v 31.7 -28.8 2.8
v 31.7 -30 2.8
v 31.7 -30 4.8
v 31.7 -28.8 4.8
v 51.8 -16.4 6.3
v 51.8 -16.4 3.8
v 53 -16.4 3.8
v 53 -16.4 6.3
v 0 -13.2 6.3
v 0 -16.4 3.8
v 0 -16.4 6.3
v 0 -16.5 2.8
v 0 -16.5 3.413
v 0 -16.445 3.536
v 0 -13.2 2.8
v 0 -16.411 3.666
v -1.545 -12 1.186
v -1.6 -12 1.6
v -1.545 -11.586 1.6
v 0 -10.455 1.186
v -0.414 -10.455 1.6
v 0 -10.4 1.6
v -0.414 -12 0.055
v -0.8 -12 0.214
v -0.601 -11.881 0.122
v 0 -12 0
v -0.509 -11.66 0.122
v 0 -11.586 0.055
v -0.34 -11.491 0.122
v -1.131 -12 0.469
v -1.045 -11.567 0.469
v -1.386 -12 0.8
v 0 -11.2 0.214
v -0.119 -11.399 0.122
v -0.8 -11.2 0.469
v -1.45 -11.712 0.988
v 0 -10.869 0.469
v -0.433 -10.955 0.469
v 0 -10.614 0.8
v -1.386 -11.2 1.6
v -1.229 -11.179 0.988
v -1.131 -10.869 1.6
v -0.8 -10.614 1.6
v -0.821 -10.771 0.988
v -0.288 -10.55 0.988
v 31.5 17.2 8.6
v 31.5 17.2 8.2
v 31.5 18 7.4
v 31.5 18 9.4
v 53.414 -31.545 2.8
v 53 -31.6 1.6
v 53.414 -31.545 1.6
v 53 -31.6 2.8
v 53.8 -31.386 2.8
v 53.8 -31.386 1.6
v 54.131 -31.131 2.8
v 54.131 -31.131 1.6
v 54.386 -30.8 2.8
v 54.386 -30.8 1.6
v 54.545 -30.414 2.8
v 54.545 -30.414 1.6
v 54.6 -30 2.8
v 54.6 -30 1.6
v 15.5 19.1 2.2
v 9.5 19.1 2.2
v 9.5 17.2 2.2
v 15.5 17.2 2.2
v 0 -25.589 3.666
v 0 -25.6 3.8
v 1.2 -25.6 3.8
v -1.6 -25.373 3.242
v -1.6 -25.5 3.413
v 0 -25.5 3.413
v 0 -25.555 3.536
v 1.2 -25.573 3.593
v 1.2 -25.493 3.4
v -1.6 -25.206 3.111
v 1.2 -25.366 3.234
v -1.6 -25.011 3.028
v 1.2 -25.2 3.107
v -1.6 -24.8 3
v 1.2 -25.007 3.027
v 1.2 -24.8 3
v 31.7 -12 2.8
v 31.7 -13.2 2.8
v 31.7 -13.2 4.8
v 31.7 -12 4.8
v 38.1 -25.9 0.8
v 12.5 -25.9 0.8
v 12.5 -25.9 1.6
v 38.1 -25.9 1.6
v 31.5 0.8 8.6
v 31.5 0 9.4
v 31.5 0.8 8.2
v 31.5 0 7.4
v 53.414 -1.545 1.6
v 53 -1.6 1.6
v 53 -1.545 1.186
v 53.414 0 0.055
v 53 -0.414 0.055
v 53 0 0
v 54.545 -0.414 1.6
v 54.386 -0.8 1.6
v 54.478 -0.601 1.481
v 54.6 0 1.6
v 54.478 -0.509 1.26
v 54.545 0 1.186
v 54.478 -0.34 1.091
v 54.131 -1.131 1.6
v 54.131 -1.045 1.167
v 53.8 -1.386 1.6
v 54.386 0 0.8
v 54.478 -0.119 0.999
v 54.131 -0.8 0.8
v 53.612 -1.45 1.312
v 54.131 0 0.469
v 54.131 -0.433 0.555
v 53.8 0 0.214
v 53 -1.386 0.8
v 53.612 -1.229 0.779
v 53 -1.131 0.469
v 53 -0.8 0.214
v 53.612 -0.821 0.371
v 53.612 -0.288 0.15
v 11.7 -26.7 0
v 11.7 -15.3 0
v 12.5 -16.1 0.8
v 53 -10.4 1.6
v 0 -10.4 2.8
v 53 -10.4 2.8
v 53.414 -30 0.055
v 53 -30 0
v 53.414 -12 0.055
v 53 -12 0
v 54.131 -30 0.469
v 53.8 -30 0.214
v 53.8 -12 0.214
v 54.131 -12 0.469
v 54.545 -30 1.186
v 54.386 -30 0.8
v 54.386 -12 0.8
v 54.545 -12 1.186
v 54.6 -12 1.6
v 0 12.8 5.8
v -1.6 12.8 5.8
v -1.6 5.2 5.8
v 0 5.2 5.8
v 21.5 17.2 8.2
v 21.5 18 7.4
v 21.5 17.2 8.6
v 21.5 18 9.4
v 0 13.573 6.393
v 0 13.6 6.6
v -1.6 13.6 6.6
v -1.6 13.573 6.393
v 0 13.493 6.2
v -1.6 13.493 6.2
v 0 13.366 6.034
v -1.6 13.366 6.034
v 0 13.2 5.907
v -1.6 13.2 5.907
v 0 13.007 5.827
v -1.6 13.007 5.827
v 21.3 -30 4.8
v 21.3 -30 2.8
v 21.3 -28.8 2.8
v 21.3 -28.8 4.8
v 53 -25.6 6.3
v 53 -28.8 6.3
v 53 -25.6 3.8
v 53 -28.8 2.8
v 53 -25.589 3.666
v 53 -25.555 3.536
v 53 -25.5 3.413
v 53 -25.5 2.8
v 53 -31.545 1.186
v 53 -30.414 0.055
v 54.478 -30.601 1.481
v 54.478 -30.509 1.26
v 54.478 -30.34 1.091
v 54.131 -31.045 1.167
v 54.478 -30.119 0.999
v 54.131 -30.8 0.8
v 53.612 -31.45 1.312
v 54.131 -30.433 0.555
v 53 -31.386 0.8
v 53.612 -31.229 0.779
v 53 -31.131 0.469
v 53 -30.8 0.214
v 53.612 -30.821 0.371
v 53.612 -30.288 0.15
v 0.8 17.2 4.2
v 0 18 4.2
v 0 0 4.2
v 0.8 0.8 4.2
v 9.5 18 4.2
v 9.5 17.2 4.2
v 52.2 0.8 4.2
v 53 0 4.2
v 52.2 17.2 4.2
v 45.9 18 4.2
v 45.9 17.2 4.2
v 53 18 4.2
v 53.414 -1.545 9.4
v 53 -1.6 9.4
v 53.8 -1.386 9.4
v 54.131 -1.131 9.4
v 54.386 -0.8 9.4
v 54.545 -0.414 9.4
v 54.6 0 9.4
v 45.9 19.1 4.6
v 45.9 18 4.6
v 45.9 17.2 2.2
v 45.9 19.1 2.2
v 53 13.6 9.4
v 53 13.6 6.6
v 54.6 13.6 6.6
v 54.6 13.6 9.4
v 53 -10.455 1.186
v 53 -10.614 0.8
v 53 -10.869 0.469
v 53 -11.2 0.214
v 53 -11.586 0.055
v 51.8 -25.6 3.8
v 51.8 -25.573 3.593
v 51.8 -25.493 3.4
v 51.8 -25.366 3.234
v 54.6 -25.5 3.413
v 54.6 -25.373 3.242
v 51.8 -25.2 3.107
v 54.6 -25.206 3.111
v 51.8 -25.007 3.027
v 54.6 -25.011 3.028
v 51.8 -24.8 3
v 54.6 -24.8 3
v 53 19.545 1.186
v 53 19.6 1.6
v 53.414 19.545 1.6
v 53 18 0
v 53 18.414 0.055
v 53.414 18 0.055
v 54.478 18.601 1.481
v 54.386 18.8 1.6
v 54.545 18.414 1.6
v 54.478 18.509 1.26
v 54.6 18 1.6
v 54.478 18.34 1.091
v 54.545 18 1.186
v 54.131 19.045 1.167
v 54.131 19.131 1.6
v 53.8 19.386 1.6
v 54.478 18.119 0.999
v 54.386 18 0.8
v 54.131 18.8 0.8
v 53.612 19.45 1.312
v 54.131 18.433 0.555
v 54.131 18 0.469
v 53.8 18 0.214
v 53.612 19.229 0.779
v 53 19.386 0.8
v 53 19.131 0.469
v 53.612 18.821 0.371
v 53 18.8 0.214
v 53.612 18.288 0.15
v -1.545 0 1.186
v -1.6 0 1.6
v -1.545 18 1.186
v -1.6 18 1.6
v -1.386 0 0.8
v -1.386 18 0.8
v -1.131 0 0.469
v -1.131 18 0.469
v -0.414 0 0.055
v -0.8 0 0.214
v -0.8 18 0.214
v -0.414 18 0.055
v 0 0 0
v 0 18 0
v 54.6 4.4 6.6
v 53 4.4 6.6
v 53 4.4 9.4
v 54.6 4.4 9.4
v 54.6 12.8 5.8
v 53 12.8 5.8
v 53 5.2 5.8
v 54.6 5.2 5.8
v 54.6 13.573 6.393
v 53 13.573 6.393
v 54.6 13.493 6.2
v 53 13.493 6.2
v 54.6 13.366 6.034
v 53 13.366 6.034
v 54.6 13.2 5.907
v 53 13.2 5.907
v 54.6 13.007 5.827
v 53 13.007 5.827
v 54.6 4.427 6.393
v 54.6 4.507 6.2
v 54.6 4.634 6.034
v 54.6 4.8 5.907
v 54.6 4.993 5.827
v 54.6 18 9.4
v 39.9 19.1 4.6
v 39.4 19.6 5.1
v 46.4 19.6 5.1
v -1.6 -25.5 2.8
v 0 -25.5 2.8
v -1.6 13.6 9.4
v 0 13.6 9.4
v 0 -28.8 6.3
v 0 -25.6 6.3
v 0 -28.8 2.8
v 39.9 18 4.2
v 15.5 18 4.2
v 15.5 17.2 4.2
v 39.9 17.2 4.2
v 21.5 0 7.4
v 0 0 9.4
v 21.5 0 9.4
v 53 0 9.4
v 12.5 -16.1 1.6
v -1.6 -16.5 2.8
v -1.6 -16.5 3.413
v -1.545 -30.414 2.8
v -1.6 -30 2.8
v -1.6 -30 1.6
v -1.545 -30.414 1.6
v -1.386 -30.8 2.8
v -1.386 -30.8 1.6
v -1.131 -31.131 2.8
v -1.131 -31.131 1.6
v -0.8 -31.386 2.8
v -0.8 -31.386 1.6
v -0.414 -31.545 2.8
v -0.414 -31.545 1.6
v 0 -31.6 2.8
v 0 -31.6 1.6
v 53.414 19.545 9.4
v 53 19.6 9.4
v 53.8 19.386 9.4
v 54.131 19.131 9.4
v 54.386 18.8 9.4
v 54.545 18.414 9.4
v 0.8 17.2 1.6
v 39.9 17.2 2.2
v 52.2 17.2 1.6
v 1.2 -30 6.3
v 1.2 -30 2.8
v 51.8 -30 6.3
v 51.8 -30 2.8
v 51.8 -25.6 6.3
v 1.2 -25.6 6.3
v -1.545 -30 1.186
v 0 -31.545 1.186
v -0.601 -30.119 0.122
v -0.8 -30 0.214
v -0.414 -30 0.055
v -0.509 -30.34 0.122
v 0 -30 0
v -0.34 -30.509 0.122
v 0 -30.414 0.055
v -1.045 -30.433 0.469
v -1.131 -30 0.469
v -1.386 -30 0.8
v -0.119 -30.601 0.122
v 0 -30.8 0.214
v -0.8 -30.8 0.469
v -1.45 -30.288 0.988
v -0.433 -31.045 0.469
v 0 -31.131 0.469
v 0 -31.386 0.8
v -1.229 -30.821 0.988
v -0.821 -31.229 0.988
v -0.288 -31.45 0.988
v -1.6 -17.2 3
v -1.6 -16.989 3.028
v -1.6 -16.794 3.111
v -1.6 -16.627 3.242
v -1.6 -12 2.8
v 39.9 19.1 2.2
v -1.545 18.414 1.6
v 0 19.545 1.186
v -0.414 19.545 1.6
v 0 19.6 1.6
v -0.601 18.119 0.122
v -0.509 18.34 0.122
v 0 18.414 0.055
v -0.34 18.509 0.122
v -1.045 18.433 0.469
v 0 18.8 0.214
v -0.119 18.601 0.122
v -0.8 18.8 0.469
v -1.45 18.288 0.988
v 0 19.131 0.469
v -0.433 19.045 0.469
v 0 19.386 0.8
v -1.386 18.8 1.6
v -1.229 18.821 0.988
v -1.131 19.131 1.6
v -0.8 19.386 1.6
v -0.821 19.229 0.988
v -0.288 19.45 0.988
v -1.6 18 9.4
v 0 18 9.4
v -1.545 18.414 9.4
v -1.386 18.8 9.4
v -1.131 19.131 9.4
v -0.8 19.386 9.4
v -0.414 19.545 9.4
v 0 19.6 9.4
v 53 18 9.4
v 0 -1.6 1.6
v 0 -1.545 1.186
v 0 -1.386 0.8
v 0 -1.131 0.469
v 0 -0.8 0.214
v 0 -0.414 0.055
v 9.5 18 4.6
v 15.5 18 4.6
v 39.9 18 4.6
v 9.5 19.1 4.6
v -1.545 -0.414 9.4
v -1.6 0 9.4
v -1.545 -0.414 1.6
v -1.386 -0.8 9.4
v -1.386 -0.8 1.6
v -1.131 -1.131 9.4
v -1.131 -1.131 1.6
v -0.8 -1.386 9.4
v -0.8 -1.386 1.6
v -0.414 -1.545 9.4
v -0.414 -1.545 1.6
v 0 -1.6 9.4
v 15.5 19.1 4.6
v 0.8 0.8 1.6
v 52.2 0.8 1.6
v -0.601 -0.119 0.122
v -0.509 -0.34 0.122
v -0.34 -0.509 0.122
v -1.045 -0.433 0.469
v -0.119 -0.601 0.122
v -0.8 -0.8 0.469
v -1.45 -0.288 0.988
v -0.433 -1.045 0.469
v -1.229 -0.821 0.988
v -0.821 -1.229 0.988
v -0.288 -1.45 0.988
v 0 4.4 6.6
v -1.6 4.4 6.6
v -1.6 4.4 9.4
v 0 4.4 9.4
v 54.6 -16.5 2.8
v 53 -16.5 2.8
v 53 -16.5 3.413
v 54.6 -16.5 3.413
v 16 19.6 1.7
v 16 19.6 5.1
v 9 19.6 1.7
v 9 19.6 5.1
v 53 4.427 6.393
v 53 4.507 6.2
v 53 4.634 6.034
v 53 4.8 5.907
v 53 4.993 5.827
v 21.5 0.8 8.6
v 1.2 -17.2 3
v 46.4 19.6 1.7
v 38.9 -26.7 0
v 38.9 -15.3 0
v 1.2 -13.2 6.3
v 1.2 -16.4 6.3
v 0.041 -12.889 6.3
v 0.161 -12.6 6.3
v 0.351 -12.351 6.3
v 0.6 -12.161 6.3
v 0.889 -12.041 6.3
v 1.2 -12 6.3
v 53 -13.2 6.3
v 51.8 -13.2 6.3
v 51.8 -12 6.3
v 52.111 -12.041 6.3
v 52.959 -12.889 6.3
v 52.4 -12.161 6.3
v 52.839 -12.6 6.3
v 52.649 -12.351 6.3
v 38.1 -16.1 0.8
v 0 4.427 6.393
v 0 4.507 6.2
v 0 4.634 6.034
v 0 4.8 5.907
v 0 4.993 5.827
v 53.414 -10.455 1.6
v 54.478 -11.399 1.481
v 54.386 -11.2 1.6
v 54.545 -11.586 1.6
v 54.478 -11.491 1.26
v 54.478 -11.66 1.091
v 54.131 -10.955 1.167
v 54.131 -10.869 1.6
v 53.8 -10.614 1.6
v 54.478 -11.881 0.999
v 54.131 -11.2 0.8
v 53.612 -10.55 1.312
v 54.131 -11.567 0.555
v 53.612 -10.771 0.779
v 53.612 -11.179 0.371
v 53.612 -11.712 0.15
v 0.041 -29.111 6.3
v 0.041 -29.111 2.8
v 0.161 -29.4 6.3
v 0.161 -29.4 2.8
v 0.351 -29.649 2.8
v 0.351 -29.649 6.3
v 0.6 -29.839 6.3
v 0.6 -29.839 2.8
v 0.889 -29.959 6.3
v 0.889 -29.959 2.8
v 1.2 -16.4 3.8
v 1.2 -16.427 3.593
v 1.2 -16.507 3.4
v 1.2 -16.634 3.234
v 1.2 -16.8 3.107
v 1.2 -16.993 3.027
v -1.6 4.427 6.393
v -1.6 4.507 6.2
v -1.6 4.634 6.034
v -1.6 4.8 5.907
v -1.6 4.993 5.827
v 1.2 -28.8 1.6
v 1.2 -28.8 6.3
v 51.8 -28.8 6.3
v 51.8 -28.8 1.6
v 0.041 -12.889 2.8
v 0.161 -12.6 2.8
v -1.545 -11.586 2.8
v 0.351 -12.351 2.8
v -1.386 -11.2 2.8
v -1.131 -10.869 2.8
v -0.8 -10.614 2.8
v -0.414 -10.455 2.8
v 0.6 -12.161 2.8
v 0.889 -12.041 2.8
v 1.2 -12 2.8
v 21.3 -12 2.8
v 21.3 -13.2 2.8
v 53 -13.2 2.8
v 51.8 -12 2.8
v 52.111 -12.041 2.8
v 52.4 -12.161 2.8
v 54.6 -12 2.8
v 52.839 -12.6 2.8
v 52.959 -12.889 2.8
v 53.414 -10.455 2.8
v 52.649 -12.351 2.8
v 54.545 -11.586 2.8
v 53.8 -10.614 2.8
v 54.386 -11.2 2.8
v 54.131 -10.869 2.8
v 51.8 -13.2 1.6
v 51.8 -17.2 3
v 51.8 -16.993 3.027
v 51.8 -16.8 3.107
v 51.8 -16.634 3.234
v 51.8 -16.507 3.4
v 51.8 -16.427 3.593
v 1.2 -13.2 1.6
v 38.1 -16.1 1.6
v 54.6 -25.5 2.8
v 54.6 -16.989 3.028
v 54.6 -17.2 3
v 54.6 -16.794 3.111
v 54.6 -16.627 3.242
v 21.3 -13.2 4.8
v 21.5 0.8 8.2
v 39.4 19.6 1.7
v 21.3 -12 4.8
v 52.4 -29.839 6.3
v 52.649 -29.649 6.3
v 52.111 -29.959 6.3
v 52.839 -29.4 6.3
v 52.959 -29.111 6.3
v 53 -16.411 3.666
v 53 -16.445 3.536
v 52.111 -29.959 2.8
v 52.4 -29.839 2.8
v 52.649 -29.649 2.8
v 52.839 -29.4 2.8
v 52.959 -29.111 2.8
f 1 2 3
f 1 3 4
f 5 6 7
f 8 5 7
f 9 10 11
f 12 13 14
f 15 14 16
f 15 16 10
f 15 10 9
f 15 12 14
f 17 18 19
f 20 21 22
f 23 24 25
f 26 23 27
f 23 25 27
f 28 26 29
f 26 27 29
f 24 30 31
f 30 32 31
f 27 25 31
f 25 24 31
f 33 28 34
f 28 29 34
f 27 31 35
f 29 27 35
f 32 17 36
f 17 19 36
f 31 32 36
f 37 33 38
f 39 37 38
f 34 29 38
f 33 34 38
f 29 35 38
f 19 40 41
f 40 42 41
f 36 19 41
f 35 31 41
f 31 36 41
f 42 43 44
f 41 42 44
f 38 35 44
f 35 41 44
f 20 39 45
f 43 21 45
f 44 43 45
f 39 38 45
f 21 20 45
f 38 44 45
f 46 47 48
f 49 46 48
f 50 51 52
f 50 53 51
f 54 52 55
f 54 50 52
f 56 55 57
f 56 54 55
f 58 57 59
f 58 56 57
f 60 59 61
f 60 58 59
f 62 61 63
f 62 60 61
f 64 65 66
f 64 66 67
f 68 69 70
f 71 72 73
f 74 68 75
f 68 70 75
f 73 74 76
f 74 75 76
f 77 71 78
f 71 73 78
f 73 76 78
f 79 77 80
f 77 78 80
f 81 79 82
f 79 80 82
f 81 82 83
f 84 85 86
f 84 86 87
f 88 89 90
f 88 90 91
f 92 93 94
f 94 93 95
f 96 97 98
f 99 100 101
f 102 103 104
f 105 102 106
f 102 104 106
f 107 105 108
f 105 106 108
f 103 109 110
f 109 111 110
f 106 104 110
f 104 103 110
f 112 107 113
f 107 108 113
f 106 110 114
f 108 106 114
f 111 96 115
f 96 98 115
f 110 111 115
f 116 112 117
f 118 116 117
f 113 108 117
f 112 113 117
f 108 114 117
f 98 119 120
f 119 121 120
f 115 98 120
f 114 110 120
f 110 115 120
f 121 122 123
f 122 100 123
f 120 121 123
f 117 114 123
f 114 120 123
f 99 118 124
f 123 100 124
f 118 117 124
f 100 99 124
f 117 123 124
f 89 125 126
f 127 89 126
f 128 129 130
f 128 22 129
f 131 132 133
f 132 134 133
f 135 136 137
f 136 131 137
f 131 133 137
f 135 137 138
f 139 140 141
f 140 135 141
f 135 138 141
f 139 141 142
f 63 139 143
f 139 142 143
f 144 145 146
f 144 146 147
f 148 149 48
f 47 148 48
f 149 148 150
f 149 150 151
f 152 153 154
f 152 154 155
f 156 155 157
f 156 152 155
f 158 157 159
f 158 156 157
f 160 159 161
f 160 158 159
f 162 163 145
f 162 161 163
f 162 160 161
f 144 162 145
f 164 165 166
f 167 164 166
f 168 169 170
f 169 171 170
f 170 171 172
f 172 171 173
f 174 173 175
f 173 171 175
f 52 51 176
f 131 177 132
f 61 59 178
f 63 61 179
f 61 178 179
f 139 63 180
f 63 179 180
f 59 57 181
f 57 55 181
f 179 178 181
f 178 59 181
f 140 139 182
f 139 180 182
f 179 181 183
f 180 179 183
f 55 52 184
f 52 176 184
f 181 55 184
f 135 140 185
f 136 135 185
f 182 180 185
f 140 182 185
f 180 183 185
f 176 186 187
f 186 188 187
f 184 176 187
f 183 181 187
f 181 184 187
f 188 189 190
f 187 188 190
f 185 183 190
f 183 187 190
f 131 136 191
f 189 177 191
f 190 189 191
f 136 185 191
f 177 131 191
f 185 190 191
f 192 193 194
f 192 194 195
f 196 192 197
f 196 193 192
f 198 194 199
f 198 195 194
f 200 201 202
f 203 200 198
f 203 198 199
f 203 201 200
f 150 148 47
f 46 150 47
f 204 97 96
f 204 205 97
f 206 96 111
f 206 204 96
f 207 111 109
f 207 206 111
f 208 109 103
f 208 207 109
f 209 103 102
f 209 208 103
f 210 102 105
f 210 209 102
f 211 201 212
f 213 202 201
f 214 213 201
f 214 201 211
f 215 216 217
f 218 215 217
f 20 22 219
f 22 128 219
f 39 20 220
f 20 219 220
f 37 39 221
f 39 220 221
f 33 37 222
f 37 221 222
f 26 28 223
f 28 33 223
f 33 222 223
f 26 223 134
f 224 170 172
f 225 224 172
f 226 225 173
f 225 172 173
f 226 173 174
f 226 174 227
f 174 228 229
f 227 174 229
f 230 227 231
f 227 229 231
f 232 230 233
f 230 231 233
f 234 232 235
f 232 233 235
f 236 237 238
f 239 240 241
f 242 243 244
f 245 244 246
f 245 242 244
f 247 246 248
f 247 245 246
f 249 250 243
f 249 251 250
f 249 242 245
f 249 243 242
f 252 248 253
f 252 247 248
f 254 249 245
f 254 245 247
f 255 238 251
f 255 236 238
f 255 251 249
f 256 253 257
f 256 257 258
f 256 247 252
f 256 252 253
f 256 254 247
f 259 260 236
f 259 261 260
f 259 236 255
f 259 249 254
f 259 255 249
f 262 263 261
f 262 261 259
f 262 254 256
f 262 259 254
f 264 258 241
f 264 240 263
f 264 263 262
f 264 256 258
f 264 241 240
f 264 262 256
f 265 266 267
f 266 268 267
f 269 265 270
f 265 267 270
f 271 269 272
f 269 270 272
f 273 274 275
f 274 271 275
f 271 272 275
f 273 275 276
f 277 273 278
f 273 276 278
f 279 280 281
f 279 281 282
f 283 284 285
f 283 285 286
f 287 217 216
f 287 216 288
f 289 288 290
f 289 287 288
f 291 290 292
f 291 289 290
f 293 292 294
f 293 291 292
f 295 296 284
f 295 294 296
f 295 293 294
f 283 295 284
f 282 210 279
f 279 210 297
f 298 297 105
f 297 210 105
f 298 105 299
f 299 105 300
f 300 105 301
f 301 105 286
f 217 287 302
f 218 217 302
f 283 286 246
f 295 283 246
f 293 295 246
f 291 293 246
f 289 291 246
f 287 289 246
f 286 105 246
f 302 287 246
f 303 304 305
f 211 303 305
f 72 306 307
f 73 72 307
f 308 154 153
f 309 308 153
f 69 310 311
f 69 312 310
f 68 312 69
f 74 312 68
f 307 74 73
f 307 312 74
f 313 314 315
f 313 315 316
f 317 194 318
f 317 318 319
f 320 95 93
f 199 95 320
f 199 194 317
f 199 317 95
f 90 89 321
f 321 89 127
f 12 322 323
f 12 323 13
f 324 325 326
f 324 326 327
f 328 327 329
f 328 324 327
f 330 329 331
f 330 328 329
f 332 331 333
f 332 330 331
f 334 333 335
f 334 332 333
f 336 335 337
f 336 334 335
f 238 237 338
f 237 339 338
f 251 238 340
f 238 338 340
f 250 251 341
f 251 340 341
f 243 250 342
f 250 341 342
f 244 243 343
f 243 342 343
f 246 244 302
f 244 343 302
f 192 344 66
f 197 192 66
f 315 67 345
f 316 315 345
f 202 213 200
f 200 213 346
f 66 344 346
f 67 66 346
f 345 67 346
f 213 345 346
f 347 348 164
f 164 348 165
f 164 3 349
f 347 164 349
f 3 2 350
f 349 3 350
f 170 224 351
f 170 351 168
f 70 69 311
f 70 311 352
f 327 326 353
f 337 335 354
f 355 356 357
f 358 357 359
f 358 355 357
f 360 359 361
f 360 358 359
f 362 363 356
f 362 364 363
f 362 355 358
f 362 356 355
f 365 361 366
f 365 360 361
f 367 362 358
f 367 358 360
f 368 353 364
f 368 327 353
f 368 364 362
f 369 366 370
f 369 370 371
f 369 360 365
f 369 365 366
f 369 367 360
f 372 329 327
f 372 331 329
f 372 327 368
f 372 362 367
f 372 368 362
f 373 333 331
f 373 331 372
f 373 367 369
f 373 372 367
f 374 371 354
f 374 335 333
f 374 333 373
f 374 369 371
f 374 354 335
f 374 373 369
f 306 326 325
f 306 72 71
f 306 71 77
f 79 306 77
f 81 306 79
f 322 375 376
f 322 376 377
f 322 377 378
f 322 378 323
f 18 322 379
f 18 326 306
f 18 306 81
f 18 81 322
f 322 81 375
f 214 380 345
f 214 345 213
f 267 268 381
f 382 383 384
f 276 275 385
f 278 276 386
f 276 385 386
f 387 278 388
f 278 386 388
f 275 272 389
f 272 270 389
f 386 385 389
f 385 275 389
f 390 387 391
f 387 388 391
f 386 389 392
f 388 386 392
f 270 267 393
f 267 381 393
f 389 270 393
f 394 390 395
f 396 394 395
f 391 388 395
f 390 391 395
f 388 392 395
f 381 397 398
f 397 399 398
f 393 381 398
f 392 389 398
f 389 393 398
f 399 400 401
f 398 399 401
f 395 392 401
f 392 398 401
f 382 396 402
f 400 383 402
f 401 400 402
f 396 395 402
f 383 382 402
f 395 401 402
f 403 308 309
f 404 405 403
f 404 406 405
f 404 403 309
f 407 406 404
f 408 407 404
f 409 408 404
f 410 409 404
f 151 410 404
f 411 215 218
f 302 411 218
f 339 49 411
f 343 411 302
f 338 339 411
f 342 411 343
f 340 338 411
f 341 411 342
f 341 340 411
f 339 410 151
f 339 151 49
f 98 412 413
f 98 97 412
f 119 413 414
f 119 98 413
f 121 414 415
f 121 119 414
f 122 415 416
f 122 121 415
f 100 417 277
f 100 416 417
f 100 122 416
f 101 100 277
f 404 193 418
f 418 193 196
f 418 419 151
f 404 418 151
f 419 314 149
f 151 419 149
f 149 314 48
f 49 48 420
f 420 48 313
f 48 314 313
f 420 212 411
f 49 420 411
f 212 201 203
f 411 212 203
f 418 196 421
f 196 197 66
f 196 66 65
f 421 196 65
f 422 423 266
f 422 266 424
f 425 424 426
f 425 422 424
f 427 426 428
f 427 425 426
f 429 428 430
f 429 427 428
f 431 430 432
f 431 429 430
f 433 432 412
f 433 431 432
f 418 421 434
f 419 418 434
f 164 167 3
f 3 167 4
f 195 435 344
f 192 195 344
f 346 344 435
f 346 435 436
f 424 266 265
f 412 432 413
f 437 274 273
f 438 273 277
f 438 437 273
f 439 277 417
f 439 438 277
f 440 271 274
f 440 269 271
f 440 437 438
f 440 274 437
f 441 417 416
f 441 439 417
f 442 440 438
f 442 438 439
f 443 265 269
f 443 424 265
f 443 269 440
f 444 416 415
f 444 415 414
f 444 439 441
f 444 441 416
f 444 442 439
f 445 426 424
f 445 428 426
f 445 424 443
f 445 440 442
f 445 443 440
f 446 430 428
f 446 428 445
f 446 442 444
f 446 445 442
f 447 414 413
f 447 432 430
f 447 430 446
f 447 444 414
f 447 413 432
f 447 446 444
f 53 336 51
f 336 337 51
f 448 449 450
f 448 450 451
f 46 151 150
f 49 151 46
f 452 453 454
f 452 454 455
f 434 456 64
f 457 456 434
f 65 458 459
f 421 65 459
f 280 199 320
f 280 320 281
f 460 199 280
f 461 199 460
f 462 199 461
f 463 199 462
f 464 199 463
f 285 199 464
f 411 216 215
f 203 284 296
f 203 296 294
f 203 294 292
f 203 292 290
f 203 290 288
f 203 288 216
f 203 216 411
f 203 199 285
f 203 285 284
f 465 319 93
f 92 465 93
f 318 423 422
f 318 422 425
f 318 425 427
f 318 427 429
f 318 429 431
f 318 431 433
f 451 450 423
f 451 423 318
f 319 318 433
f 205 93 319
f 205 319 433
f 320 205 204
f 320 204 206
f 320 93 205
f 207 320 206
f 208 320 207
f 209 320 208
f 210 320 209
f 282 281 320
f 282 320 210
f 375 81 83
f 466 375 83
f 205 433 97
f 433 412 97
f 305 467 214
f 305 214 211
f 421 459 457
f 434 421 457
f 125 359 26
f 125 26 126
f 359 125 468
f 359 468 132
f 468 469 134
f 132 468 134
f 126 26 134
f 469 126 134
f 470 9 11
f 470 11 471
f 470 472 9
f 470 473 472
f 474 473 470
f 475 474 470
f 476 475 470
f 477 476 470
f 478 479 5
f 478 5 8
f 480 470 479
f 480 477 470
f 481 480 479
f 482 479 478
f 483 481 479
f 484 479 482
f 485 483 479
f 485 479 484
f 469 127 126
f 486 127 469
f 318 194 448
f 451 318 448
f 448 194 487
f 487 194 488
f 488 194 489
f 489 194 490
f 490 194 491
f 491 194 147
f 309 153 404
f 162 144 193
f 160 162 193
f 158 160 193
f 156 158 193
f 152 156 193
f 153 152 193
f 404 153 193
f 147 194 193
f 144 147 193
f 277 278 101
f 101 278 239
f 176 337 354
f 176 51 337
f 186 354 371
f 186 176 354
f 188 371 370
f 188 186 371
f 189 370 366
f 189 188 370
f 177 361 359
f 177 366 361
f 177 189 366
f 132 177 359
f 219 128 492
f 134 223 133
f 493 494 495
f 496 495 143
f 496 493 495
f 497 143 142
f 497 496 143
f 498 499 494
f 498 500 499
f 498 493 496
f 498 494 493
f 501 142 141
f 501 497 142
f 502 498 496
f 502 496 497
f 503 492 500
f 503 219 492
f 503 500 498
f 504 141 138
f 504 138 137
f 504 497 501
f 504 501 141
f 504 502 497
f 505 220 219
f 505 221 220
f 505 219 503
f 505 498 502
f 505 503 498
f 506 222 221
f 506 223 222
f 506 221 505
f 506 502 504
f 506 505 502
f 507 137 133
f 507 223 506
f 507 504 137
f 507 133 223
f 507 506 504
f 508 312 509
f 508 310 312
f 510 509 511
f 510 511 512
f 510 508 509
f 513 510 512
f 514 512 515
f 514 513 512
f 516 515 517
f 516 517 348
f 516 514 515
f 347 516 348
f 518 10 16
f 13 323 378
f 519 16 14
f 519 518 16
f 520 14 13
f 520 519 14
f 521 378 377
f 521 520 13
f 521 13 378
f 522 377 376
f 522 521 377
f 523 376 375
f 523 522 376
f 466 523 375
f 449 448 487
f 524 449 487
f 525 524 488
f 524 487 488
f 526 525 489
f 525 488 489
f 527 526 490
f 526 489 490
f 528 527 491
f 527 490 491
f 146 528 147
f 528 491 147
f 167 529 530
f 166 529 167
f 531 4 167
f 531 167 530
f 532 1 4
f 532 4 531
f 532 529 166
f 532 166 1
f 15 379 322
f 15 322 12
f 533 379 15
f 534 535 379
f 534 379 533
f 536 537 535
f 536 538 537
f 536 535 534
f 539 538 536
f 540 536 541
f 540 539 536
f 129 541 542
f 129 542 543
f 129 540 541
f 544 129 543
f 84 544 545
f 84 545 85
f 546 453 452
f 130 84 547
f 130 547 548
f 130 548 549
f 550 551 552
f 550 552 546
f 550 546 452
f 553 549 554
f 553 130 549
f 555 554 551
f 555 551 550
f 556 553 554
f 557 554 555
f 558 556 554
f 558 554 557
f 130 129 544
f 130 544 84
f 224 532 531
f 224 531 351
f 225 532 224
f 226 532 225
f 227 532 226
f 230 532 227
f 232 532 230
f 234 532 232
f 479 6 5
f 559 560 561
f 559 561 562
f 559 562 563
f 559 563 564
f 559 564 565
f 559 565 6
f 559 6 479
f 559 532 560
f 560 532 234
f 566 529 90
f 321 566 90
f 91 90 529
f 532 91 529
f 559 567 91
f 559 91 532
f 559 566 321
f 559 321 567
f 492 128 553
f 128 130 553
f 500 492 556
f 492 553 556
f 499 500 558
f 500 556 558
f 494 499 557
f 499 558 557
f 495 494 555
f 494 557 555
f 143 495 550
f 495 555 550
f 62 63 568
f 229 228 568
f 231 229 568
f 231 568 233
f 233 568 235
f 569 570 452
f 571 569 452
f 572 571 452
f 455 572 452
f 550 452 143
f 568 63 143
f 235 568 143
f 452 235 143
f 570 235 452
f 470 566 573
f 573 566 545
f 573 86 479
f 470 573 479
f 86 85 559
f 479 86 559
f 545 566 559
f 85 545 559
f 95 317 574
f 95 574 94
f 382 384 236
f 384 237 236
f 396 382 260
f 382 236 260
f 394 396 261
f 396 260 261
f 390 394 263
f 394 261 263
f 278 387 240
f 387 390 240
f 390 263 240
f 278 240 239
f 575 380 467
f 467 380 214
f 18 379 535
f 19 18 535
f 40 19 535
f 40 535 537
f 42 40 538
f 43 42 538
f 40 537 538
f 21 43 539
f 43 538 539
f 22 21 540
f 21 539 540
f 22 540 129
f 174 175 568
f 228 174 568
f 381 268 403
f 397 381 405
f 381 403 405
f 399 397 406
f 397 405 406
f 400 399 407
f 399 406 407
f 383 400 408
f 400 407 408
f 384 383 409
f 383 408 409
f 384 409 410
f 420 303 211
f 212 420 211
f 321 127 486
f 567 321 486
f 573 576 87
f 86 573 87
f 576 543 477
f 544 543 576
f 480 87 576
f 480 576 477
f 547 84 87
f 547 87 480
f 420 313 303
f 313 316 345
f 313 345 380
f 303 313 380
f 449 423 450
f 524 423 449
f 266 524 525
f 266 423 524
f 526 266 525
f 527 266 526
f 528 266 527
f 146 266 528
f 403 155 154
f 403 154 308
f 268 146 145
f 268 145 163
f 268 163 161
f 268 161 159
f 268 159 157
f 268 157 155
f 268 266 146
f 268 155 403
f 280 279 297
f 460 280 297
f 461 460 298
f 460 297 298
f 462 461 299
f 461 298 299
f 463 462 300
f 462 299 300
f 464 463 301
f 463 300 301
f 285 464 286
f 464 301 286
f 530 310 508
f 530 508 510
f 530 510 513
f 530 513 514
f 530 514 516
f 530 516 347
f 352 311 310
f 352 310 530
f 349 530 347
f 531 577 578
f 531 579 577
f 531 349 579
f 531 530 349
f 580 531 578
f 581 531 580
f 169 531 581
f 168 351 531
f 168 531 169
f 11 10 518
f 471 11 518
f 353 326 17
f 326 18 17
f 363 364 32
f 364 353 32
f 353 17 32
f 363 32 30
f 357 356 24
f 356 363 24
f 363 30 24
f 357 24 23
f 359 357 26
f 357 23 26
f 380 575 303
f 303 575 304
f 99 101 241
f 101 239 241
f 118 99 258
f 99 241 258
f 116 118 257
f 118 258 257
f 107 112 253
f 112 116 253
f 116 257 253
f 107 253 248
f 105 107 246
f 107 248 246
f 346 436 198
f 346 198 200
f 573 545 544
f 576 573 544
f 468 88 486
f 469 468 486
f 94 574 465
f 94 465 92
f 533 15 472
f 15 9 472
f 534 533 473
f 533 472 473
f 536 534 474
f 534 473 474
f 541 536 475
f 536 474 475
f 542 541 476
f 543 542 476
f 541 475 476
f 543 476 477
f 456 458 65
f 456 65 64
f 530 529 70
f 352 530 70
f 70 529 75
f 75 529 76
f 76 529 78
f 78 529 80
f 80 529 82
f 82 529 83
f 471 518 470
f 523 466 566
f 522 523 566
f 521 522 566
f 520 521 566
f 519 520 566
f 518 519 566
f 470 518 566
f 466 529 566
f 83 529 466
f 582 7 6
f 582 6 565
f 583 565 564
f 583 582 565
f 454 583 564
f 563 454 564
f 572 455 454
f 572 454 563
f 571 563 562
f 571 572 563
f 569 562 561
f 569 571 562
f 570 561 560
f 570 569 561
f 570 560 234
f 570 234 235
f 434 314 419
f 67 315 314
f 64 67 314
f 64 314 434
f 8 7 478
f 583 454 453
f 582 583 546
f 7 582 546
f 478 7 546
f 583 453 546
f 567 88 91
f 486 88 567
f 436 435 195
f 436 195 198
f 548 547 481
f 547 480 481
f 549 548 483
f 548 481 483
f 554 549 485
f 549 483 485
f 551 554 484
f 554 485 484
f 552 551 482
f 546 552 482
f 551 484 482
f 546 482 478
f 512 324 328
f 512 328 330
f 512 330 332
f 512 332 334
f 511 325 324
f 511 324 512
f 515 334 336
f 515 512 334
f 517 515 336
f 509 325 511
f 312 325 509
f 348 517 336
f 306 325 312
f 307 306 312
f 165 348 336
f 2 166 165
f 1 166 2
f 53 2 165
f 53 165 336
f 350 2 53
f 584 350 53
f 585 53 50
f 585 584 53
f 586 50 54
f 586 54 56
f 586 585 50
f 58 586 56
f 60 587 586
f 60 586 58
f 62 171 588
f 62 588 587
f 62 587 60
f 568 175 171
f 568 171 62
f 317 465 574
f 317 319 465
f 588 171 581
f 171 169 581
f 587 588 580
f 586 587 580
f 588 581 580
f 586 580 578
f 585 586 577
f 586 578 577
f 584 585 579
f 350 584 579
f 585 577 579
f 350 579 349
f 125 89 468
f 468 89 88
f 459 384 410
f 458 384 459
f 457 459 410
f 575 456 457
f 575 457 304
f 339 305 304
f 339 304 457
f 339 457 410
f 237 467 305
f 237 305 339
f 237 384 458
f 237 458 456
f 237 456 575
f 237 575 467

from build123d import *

# Parameters (mm, degrees)
BOX009_W        = 6
BOX009_H        = 10
BOX009_DEPTH    = 2.4
BOX006_W        = 10
BOX006_H        = 9.2
BOX006_DEPTH    = 4
FILLET002_R     = 0.8
BOX019_W        = 10
BOX019_H        = 9.2
BOX019_DEPTH    = 4.6
FILLET003_R     = 0.8
BOX008_W        = 6
BOX008_H        = 10
BOX008_DEPTH    = 2.4
BOX003_W        = 51.4
BOX003_H        = 16.4
BOX003_DEPTH    = 2.6
BOX002_W        = 53
BOX002_H        = 18
BOX002_DEPTH    = 2.6
BOX004_W        = 10
BOX004_H        = 1
BOX004_DEPTH    = 2
CHAMFER_SIZE    = 0.8
BOX005_W        = 10
BOX005_H        = 1
BOX005_DEPTH    = 2
CHAMFER001_SIZE = 0.8
BOX001_W        = 53
BOX001_H        = 18
BOX001_DEPTH    = 9.4
BOX_W           = 56.2
BOX_H           = 21.2
BOX_DEPTH       = 9.4
FILLET_R        = 1.6
CHAMFER002_SIZE = 0.5
BOX017_W        = 10.4
BOX017_H        = 5
BOX017_DEPTH    = 2
BOX018_W        = 10.4
BOX018_H        = 5
BOX018_DEPTH    = 2
BOX020_W        = 10
BOX020_H        = 9.2
BOX020_DEPTH    = 4.6
FILLET004_R     = 0.8
BOX021_W        = 10
BOX021_H        = 9.2
BOX021_DEPTH    = 4.6
FILLET005_R     = 0.8
BOX014_W        = 25.6
BOX014_H        = 9.8
BOX014_DEPTH    = 1.6
BOX013_W        = 50.6
BOX013_H        = 15.6
BOX013_DEPTH    = 4.8
BOX012_W        = 53
BOX012_H        = 18
BOX012_DEPTH    = 4.7
BOX022_W        = 1.6
BOX022_H        = 9
BOX022_DEPTH    = 3
BOX023_W        = 1.6
BOX023_H        = 9
BOX023_DEPTH    = 3
BOX011_W        = 53
BOX011_H        = 18
BOX011_DEPTH    = 9.4
BOX010_W        = 56.2
BOX010_H        = 21.2
BOX010_DEPTH    = 2.8
FILLET001_R     = 1.6
CHAMFER003_SIZE = 0.8
FILLET006_R     = 1.2


with BuildPart() as button2:
    # Box009 → Box009 (new body)
    with BuildSketch(Plane(origin=(39.9, 14, 2.2), x_dir=(1, 0, 0), z_dir=(0, 0, 1))):
        with Locations((3, 5)):
            Rectangle(BOX009_W, BOX009_H)
    extrude(amount=BOX009_DEPTH)


with BuildPart() as usb_buchse1:
    # Box006 → Box006 (new body)
    with BuildSketch(Plane(origin=(-5, 4.4, 5.8), x_dir=(1, 0, 0), z_dir=(0, 0, 1))):
        with Locations((5, 4.6)):
            Rectangle(BOX006_W, BOX006_H)
    extrude(amount=BOX006_DEPTH)

    # Fillet002
    fillet002_edges = [usb_buchse1.edges().sort_by_distance(p)[0] for p in [
        (0, 4.4, 5.8),
        (0, 13.6, 5.8),
    ]]
    fillet(fillet002_edges, radius=FILLET002_R)


with BuildPart() as usb_buchse2:
    # Box019 → Box019 (new body)
    with BuildSketch(Plane(origin=(47, 4.4, 5.8), x_dir=(1, 0, 0), z_dir=(0, 0, 1))):
        with Locations((5, 4.6)):
            Rectangle(BOX019_W, BOX019_H)
    extrude(amount=BOX019_DEPTH)

    # Fillet003
    fillet003_edges = [usb_buchse2.edges().sort_by_distance(p)[0] for p in [
        (52, 4.4, 5.8),
        (52, 13.6, 5.8),
    ]]
    fillet(fillet003_edges, radius=FILLET003_R)


with BuildPart() as bottom_cutouts:
    # Box008 → Box008 (new body)
    with BuildSketch(Plane(origin=(9.5, 14, 2.2), x_dir=(1, 0, 0), z_dir=(0, 0, 1))):
        with Locations((3, 5)):
            Rectangle(BOX008_W, BOX008_H)
    extrude(amount=BOX008_DEPTH)

    # Fusion001: union Button2, USB_Buchse1, USB_Buchse2
    add(button2.part)
    add(usb_buchse1.part)
    add(usb_buchse2.part)


with BuildPart() as auflage_innen:
    # Box003 → Box003 (new body)
    with BuildSketch(Plane(origin=(0.8, 0.8, 1.6), x_dir=(1, 0, 0), z_dir=(0, 0, 1))):
        with Locations((25.7, 8.2)):
            Rectangle(BOX003_W, BOX003_H)
    extrude(amount=BOX003_DEPTH)


with BuildPart() as auflage:
    # Box002 → Box002 (new body)
    with BuildSketch(Plane.XY.offset(1.6)):
        with Locations((26.5, 9)):
            Rectangle(BOX002_W, BOX002_H)
    extrude(amount=BOX002_DEPTH)

    # Cut001: cut Auflage_innen
    add(auflage_innen.part, mode=Mode.SUBTRACT)


with BuildPart() as haken1:
    # Box004 → Box004 (new body)
    with BuildSketch(Plane(origin=(21.5, -0.2, 7.4), x_dir=(1, 0, 0), z_dir=(0, 0, 1))):
        with Locations((5, 0.5)):
            Rectangle(BOX004_W, BOX004_H)
    extrude(amount=BOX004_DEPTH)

    # Chamfer
    chamfer_edges = [haken1.edges().sort_by_distance(p)[0] for p in [
        (26.5, 0.8, 7.4),
        (26.5, 0.8, 9.4),
    ]]
    chamfer(chamfer_edges, length=CHAMFER_SIZE)


with BuildPart() as haken2:
    # Box005 → Box005 (new body)
    with BuildSketch(Plane(origin=(21.5, 17.2, 7.4), x_dir=(1, 0, 0), z_dir=(0, 0, 1))):
        with Locations((5, 0.5)):
            Rectangle(BOX005_W, BOX005_H)
    extrude(amount=BOX005_DEPTH)

    # Chamfer001
    chamfer001_edges = [haken2.edges().sort_by_distance(p)[0] for p in [
        (26.5, 17.2, 7.4),
        (26.5, 17.2, 9.4),
    ]]
    chamfer(chamfer001_edges, length=CHAMFER001_SIZE)


with BuildPart() as unten_innen:
    # Box001 → Box001 (new body)
    with BuildSketch(Plane.XY.offset(1.6)):
        with Locations((26.5, 9)):
            Rectangle(BOX001_W, BOX001_H)
    extrude(amount=BOX001_DEPTH)


with BuildPart() as cover_bottom:
    # Box → Box (new body)
    with BuildSketch(Plane(origin=(-1.6, -1.6, 0), x_dir=(1, 0, 0), z_dir=(0, 0, 1))):
        with Locations((28.1, 10.6)):
            Rectangle(BOX_W, BOX_H)
    extrude(amount=BOX_DEPTH)

    # Cut: cut unten_innen
    add(unten_innen.part, mode=Mode.SUBTRACT)

    # Fillet
    fillet_edges = [cover_bottom.edges().sort_by_distance(p)[0] for p in [
        (-1.6, -1.6, 4.7),
        (-1.6, 19.6, 4.7),
        (-1.6, 9, 0),
        (26.5, -1.6, 0),
        (54.6, -1.6, 4.7),
        (26.5, 19.6, 0),
        (54.6, 19.6, 4.7),
        (54.6, 9, 0),
    ]]
    fillet(fillet_edges, radius=FILLET_R)

    # Fusion: union Auflage, Haken1, Haken2
    add(auflage.part)
    add(haken1.part)
    add(haken2.part)

    # Cut004: cut bottom_cutouts
    add(bottom_cutouts.part, mode=Mode.SUBTRACT)

    # Chamfer002
    chamfer002_edges = [cover_bottom.edges().sort_by_distance(p)[0] for p in [
        (45.9, 19.6, 3.4),
        (42.9, 19.6, 2.2),
        (39.9, 19.6, 3.4),
        (42.9, 19.6, 4.6),
        (9.5, 19.6, 3.4),
        (12.5, 19.6, 4.6),
        (15.5, 19.6, 3.4),
        (12.5, 19.6, 2.2),
    ]]
    chamfer(chamfer002_edges, length=CHAMFER002_SIZE)


with BuildPart() as oese1:
    # Box017 → Box017 (new body)
    with BuildSketch(Plane(origin=(21.3, -33, 2.8), x_dir=(1, 0, 0), z_dir=(0, 0, 1))):
        with Locations((5.2, 2.5)):
            Rectangle(BOX017_W, BOX017_H)
    extrude(amount=BOX017_DEPTH)


with BuildPart() as oese2:
    # Box018 → Box018 (new body)
    with BuildSketch(Plane(origin=(21.3, -15, 2.8), x_dir=(1, 0, 0), z_dir=(0, 0, 1))):
        with Locations((5.2, 2.5)):
            Rectangle(BOX018_W, BOX018_H)
    extrude(amount=BOX018_DEPTH)


with BuildPart() as usb_buchse3:
    # Box020 → Box020 (new body)
    with BuildSketch(Plane(origin=(-5, -25.6, 3), x_dir=(1, 0, 0), z_dir=(0, 0, 1))):
        with Locations((5, 4.6)):
            Rectangle(BOX020_W, BOX020_H)
    extrude(amount=BOX020_DEPTH)

    # Fillet004
    fillet004_edges = [usb_buchse3.edges().sort_by_distance(p)[0] for p in [
        (0, -25.6, 3),
        (0, -16.4, 3),
    ]]
    fillet(fillet004_edges, radius=FILLET004_R)


with BuildPart() as usb_buchse4:
    # Box021 → Box021 (new body)
    with BuildSketch(Plane(origin=(47, -25.6, 3), x_dir=(1, 0, 0), z_dir=(0, 0, 1))):
        with Locations((5, 4.6)):
            Rectangle(BOX021_W, BOX021_H)
    extrude(amount=BOX021_DEPTH)

    # Fillet005
    fillet005_edges = [usb_buchse4.edges().sort_by_distance(p)[0] for p in [
        (52, -25.6, 3),
        (52, -16.4, 3),
    ]]
    fillet(fillet005_edges, radius=FILLET005_R)


with BuildPart() as top_cutouts:
    # Box014 → Box014 (new body)
    with BuildSketch(Plane(origin=(12.5, -25.9, 0), x_dir=(1, 0, 0), z_dir=(0, 0, 1))):
        with Locations((12.8, 4.9)):
            Rectangle(BOX014_W, BOX014_H)
    extrude(amount=BOX014_DEPTH)

    # Fusion003: union Oese1, Oese2, USB-Buchse3, USB-Buchse4
    add(oese1.part)
    add(oese2.part)
    add(usb_buchse3.part)
    add(usb_buchse4.part)


with BuildPart() as rahmen_innen:
    # Box013 → Box013 (new body)
    with BuildSketch(Plane(origin=(1.2, -28.8, 1.6), x_dir=(1, 0, 0), z_dir=(0, 0, 1))):
        with Locations((25.3, 7.8)):
            Rectangle(BOX013_W, BOX013_H)
    extrude(amount=BOX013_DEPTH)


with BuildPart() as rahmen:
    # Box012 → Box012 (new body)
    with BuildSketch(Plane(origin=(0, -30, 1.6), x_dir=(1, 0, 0), z_dir=(0, 0, 1))):
        with Locations((26.5, 9)):
            Rectangle(BOX012_W, BOX012_H)
    extrude(amount=BOX012_DEPTH)

    # Cut003: cut Rahmen_innen
    add(rahmen_innen.part, mode=Mode.SUBTRACT)


with BuildPart() as nut1:
    # Box022 → Box022 (new body)
    with BuildSketch(Plane(origin=(-1.6, -25.5, 2.8), x_dir=(1, 0, 0), z_dir=(0, 0, 1))):
        with Locations((0.8, 4.5)):
            Rectangle(BOX022_W, BOX022_H)
    extrude(amount=BOX022_DEPTH)


with BuildPart() as nut2:
    # Box023 → Box023 (new body)
    with BuildSketch(Plane(origin=(53, -25.5, 2.8), x_dir=(1, 0, 0), z_dir=(0, 0, 1))):
        with Locations((0.8, 4.5)):
            Rectangle(BOX023_W, BOX023_H)
    extrude(amount=BOX023_DEPTH)


with BuildPart() as oben_innen:
    # Box011 → Box011 (new body)
    with BuildSketch(Plane(origin=(0, -30, 1.6), x_dir=(1, 0, 0), z_dir=(0, 0, 1))):
        with Locations((26.5, 9)):
            Rectangle(BOX011_W, BOX011_H)
    extrude(amount=BOX011_DEPTH)


with BuildPart() as cover_top:
    # Box010 → Box010 (new body)
    with BuildSketch(Plane(origin=(-1.6, -31.6, 0), x_dir=(1, 0, 0), z_dir=(0, 0, 1))):
        with Locations((28.1, 10.6)):
            Rectangle(BOX010_W, BOX010_H)
    extrude(amount=BOX010_DEPTH)

    # Cut002: cut oben_innen
    add(oben_innen.part, mode=Mode.SUBTRACT)

    # Fillet001
    fillet001_edges = [cover_top.edges().sort_by_distance(p)[0] for p in [
        (-1.6, -31.6, 1.4),
        (-1.6, -10.4, 1.4),
        (-1.6, -21, 0),
        (26.5, -31.6, 0),
        (54.6, -31.6, 1.4),
        (26.5, -10.4, 0),
        (54.6, -10.4, 1.4),
        (54.6, -21, 0),
    ]]
    fillet(fillet001_edges, radius=FILLET001_R)

    # Fusion002: union Rahmen, Nut1, Nut2
    add(rahmen.part)
    add(nut1.part)
    add(nut2.part)

    # Cut005: cut top_cutouts
    add(top_cutouts.part, mode=Mode.SUBTRACT)

    # Chamfer003
    chamfer003_edges = [cover_top.edges().sort_by_distance(p)[0] for p in [
        (25.3, -16.1, 0),
        (12.5, -21, 0),
        (25.3, -25.9, 0),
        (38.1, -21, 0),
    ]]
    chamfer(chamfer003_edges, length=CHAMFER003_SIZE)

    # Fillet006
    fillet006_edges = [cover_top.edges().sort_by_distance(p)[0] for p in [
        (0, -30, 4.55),
        (53, -30, 4.55),
        (53, -12, 4.55),
        (0, -12, 4.55),
    ]]
    fillet(fillet006_edges, radius=FILLET006_R)


solid = Compound([cover_bottom.part, cover_top.part])
